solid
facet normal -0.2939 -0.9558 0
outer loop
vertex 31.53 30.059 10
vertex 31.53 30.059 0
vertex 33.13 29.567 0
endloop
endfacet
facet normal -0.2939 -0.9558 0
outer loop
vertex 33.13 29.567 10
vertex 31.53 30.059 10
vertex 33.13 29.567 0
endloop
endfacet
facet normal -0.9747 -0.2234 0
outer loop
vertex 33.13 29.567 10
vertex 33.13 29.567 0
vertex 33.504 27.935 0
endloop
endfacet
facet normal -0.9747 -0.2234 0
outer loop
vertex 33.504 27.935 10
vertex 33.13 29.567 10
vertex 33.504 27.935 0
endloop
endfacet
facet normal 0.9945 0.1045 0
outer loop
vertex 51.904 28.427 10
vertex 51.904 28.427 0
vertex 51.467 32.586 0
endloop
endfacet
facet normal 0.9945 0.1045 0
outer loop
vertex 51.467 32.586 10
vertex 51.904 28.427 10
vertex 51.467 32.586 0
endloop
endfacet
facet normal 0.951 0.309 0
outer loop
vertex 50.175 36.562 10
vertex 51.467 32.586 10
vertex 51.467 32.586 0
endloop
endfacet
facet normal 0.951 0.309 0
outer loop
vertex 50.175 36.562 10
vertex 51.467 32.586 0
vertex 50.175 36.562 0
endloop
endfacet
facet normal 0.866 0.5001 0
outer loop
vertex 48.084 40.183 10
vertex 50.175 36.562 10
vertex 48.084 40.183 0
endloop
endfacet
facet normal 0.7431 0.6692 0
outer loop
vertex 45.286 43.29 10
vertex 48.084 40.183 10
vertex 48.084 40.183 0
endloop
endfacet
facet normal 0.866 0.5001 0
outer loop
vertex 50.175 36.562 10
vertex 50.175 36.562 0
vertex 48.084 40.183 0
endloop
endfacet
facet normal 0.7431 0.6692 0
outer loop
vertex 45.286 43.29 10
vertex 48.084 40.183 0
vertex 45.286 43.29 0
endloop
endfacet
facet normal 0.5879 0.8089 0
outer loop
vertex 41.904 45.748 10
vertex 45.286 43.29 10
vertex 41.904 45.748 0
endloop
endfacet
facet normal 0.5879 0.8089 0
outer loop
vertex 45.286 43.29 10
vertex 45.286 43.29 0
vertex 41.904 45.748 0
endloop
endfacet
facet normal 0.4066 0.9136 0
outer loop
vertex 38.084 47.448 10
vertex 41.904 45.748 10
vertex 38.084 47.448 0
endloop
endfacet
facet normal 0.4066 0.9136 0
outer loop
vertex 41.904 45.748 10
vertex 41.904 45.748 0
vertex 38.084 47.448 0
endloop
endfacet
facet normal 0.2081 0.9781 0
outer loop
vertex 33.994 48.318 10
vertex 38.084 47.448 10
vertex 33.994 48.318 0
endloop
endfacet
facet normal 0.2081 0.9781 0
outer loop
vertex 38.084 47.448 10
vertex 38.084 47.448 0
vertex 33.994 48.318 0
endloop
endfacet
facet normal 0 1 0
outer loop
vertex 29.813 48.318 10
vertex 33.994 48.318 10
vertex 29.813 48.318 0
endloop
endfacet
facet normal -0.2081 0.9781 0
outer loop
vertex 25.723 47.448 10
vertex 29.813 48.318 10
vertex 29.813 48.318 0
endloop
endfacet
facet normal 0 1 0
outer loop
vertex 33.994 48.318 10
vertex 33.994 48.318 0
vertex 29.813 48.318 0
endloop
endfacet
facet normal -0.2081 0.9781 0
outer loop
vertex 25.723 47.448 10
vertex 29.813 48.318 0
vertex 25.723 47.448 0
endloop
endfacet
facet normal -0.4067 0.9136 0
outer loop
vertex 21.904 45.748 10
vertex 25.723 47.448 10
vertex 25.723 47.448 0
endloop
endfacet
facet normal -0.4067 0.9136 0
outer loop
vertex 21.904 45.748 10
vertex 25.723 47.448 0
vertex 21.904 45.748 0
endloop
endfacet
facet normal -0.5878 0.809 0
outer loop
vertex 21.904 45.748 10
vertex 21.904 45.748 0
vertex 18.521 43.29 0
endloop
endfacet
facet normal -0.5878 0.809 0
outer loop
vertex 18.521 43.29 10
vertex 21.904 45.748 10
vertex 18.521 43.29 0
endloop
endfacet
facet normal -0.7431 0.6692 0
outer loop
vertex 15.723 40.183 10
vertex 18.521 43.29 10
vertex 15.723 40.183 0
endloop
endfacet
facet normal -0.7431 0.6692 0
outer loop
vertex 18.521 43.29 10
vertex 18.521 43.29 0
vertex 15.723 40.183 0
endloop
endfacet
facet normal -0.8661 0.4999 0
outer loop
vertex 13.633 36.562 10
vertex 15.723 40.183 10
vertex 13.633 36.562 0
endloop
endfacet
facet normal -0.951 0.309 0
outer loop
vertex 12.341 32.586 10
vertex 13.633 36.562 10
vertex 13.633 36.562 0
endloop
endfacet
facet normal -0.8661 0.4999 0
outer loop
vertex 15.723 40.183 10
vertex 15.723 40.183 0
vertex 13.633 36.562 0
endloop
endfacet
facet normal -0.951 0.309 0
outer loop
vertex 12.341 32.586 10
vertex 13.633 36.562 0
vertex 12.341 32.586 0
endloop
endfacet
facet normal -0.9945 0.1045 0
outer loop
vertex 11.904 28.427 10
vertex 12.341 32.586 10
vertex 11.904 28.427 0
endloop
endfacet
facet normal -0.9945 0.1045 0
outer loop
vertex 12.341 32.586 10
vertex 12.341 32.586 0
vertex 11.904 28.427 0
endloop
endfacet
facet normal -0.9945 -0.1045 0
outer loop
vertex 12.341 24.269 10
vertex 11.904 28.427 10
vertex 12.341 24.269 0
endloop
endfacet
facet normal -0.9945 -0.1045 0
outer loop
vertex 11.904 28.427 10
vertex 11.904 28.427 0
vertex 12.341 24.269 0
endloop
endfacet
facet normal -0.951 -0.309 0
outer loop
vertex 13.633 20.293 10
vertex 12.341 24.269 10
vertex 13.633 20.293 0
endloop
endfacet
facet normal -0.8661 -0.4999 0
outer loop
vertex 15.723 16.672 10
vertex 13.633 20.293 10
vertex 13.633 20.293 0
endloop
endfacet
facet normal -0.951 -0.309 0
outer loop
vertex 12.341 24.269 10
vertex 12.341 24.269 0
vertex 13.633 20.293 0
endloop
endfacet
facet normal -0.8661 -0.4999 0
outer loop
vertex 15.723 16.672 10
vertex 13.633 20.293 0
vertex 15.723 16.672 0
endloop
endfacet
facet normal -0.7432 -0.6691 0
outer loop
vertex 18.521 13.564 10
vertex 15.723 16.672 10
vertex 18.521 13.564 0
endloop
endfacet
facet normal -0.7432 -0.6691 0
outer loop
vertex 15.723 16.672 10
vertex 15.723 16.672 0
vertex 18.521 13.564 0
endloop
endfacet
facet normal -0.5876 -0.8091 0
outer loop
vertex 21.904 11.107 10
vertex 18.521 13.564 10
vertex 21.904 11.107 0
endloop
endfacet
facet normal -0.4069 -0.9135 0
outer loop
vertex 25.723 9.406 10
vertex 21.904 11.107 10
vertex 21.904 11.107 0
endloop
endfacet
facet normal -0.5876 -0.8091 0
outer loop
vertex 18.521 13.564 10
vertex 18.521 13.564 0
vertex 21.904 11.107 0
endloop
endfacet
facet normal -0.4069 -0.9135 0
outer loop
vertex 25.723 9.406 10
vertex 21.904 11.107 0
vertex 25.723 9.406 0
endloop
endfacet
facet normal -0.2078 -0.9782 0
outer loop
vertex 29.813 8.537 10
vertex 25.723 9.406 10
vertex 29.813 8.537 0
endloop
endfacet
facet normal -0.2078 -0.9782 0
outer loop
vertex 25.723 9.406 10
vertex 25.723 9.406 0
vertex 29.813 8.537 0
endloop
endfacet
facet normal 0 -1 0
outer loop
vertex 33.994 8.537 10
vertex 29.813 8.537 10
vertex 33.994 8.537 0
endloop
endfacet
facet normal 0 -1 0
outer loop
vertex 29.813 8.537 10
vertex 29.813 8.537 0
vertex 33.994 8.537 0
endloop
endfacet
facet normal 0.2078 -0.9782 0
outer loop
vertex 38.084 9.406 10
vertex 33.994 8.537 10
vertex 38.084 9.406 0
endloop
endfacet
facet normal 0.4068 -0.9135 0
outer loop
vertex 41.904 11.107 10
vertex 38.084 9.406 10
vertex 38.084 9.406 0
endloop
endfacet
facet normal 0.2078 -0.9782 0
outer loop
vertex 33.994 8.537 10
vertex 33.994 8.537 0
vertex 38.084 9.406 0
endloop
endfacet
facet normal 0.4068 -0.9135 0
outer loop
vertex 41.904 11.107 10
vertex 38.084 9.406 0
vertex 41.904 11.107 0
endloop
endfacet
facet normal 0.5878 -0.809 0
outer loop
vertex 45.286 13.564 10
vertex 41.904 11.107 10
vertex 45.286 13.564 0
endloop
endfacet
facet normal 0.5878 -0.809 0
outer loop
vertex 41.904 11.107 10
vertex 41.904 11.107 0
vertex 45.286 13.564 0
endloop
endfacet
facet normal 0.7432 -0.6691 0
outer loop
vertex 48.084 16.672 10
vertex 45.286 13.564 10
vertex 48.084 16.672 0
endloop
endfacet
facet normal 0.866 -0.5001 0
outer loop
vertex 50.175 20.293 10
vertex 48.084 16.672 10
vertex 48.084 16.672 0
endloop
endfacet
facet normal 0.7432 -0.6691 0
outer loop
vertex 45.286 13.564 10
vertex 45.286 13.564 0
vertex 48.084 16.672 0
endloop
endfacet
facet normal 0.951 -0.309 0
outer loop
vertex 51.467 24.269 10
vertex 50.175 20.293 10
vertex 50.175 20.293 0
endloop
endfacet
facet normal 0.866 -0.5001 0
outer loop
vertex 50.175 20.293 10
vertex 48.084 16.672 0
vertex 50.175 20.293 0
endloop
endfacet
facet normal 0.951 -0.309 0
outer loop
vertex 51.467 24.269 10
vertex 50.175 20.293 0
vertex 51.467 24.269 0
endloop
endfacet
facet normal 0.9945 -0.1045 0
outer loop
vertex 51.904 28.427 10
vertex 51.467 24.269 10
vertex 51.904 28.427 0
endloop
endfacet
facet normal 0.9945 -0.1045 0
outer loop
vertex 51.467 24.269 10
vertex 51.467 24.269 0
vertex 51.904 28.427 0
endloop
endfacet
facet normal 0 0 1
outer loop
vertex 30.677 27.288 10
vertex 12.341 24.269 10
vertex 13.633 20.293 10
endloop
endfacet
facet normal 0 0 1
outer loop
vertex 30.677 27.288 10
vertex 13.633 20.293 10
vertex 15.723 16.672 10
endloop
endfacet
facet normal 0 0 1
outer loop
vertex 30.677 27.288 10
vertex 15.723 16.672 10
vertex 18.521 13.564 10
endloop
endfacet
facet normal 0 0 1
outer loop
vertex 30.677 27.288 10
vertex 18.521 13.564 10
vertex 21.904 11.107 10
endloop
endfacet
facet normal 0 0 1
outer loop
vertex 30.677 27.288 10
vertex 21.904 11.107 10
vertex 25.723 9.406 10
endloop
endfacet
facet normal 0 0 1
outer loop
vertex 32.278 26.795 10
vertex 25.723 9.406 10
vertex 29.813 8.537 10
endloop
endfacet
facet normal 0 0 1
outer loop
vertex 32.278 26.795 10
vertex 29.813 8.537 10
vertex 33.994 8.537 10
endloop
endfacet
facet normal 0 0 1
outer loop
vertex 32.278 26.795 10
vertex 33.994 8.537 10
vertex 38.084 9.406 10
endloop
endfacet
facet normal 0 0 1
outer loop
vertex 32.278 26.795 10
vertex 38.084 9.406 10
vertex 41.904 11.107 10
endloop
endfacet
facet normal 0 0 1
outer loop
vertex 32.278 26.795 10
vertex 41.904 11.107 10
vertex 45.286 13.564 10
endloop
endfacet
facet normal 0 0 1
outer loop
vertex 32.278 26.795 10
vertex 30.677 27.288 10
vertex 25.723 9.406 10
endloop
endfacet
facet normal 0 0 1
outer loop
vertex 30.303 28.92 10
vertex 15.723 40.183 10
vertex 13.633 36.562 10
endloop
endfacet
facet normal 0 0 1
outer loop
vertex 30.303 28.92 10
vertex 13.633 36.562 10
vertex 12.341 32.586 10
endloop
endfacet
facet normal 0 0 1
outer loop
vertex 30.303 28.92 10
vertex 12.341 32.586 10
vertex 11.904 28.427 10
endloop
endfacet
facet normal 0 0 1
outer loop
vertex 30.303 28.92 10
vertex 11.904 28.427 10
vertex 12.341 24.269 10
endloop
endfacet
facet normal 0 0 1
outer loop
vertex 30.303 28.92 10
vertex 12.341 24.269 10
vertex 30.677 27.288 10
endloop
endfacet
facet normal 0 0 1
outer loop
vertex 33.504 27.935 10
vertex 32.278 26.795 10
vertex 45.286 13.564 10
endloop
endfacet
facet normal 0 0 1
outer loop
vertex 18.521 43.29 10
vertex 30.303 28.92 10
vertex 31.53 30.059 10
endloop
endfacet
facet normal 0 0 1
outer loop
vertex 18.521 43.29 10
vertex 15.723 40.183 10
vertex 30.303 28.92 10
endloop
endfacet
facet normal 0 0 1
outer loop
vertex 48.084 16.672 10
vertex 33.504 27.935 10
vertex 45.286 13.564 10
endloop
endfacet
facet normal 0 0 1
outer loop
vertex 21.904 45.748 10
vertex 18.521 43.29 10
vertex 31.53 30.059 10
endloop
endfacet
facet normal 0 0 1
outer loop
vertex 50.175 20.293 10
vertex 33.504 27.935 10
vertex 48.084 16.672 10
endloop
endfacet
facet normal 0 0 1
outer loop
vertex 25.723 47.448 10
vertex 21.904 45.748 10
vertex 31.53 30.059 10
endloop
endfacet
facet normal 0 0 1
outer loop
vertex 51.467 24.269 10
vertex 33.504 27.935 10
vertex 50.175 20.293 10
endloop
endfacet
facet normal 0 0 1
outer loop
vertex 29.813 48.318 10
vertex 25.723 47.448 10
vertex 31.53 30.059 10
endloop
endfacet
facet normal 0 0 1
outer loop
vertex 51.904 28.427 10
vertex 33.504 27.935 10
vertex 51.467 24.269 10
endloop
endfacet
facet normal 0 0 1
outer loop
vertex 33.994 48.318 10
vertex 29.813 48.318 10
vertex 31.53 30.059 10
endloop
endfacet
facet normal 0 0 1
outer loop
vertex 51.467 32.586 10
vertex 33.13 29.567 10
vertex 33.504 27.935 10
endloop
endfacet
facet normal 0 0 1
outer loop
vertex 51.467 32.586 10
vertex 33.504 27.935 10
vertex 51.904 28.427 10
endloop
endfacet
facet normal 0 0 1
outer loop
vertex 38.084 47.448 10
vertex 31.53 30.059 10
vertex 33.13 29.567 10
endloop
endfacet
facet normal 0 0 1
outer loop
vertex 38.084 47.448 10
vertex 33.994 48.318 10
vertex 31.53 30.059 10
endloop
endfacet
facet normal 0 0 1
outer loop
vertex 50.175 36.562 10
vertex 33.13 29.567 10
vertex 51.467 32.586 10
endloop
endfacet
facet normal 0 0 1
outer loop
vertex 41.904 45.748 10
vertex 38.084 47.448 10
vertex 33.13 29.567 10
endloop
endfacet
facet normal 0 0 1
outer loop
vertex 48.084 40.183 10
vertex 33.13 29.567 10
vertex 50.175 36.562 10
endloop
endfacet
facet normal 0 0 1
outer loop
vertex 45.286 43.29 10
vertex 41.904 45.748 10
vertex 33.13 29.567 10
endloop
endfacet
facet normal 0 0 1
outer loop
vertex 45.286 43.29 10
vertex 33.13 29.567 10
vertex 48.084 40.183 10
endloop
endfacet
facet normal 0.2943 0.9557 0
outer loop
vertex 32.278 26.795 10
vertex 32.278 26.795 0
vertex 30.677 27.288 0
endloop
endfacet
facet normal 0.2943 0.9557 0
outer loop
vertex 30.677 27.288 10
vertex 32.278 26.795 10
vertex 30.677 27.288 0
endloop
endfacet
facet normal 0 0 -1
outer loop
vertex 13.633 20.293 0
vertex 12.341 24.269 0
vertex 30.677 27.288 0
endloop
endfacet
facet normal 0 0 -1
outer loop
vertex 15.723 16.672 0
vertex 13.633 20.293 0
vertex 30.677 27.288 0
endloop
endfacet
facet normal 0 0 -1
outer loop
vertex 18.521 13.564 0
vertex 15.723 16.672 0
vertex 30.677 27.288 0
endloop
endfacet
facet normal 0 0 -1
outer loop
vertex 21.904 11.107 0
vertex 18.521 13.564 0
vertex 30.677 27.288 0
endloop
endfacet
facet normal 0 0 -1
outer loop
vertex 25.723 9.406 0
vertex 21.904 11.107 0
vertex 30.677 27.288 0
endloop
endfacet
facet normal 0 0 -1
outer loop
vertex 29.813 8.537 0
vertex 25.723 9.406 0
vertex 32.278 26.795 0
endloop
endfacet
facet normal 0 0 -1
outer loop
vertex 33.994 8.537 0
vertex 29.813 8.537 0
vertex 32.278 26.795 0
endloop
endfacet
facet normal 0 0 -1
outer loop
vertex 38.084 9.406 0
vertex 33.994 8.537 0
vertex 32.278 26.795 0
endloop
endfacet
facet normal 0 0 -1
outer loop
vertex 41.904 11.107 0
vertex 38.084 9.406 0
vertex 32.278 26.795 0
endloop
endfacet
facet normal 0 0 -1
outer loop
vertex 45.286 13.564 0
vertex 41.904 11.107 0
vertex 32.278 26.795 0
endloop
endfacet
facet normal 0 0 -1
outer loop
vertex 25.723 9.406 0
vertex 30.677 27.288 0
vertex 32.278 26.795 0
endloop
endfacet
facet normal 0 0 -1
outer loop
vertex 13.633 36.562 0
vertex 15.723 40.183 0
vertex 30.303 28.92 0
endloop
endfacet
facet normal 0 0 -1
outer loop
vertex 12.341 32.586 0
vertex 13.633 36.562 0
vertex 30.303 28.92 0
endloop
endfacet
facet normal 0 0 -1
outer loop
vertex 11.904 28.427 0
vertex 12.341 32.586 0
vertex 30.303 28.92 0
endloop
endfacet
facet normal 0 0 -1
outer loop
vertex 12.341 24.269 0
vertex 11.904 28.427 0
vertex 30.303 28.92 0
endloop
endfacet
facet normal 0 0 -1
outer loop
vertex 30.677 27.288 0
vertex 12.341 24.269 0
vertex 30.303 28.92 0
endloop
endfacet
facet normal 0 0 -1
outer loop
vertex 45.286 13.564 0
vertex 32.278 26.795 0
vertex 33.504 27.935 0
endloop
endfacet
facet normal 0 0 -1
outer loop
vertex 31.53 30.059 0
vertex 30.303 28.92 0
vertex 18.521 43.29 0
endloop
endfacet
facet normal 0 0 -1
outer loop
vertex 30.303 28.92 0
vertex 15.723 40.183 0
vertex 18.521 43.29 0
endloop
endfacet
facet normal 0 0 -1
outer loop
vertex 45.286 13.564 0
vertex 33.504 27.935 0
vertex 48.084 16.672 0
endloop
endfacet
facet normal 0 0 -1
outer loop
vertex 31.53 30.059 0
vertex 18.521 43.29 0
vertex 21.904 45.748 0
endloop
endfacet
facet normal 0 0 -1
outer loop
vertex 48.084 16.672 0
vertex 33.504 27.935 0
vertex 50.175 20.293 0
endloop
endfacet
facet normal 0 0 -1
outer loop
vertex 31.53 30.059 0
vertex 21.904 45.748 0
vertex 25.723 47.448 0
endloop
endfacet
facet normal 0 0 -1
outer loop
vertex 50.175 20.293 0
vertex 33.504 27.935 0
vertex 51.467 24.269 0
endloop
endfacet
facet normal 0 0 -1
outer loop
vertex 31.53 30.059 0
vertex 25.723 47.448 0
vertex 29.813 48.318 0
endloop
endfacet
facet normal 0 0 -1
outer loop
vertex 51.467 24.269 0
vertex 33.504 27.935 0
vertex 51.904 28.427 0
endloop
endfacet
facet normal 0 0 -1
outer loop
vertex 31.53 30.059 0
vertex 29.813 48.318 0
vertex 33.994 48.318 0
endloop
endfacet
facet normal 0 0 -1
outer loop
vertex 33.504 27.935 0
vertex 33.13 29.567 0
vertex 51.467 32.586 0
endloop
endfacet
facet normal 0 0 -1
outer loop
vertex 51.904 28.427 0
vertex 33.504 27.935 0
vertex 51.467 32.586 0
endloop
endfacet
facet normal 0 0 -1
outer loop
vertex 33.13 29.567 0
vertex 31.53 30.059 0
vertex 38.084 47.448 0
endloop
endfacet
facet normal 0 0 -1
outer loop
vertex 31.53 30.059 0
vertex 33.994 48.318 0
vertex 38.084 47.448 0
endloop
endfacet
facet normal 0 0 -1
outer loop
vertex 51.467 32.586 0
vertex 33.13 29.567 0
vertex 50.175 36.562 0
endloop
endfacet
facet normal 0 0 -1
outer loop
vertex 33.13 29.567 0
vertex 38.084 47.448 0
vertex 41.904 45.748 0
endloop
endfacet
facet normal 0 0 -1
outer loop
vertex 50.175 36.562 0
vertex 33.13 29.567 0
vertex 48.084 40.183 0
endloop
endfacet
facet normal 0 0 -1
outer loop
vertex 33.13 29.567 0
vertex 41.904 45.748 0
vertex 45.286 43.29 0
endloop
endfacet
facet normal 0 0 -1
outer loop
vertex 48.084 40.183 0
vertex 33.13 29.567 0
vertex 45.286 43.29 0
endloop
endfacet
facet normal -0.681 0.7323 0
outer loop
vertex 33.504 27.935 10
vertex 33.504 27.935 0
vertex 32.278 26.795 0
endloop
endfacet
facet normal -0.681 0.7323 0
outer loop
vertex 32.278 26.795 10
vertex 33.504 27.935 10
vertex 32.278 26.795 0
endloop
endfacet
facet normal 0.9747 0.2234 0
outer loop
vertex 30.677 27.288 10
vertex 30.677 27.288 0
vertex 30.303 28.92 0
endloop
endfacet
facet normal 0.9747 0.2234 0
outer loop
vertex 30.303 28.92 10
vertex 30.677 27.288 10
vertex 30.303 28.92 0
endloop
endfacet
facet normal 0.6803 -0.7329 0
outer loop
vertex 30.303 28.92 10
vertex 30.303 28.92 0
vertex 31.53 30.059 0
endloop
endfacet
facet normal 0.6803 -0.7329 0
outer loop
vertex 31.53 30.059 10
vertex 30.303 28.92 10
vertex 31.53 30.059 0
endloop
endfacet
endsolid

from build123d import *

# Parameters (mm, degrees)
F0_R     = 20
F1_DEPTH = 10
F2_DEPTH = 10


# Not quite as in the source:
# - a feature names something its author has since deleted; it is built from what else it names


with BuildPart() as f1:
    # F0 (on Top) → F1 (new body)
    with BuildSketch(Plane.XY):
        with Locations((31.903732568, 28.4272767603)):
            Circle(F0_R)
        Polygon((33.1302353929, 29.5670241683), (33.5040341896, 27.9349678601), (32.2775313647, 26.7952204522), (30.6772297431, 27.2875293524), (30.3034309464, 28.9195856605), (31.5299337713, 30.0593330685), align=None, mode=Mode.SUBTRACT)
    extrude(amount=F1_DEPTH)

    # F0 (on Top) → F2 (join)
    with BuildSketch(Plane.XY):
        with Locations((31.903732568, 28.4272767603)):
            Circle(F0_R)
        Polygon((33.1302353929, 29.5670241683), (33.5040341896, 27.9349678601), (32.2775313647, 26.7952204522), (30.6772297431, 27.2875293524), (30.3034309464, 28.9195856605), (31.5299337713, 30.0593330685), align=None, mode=Mode.SUBTRACT)
    extrude(amount=F2_DEPTH)


solid = f1.part
